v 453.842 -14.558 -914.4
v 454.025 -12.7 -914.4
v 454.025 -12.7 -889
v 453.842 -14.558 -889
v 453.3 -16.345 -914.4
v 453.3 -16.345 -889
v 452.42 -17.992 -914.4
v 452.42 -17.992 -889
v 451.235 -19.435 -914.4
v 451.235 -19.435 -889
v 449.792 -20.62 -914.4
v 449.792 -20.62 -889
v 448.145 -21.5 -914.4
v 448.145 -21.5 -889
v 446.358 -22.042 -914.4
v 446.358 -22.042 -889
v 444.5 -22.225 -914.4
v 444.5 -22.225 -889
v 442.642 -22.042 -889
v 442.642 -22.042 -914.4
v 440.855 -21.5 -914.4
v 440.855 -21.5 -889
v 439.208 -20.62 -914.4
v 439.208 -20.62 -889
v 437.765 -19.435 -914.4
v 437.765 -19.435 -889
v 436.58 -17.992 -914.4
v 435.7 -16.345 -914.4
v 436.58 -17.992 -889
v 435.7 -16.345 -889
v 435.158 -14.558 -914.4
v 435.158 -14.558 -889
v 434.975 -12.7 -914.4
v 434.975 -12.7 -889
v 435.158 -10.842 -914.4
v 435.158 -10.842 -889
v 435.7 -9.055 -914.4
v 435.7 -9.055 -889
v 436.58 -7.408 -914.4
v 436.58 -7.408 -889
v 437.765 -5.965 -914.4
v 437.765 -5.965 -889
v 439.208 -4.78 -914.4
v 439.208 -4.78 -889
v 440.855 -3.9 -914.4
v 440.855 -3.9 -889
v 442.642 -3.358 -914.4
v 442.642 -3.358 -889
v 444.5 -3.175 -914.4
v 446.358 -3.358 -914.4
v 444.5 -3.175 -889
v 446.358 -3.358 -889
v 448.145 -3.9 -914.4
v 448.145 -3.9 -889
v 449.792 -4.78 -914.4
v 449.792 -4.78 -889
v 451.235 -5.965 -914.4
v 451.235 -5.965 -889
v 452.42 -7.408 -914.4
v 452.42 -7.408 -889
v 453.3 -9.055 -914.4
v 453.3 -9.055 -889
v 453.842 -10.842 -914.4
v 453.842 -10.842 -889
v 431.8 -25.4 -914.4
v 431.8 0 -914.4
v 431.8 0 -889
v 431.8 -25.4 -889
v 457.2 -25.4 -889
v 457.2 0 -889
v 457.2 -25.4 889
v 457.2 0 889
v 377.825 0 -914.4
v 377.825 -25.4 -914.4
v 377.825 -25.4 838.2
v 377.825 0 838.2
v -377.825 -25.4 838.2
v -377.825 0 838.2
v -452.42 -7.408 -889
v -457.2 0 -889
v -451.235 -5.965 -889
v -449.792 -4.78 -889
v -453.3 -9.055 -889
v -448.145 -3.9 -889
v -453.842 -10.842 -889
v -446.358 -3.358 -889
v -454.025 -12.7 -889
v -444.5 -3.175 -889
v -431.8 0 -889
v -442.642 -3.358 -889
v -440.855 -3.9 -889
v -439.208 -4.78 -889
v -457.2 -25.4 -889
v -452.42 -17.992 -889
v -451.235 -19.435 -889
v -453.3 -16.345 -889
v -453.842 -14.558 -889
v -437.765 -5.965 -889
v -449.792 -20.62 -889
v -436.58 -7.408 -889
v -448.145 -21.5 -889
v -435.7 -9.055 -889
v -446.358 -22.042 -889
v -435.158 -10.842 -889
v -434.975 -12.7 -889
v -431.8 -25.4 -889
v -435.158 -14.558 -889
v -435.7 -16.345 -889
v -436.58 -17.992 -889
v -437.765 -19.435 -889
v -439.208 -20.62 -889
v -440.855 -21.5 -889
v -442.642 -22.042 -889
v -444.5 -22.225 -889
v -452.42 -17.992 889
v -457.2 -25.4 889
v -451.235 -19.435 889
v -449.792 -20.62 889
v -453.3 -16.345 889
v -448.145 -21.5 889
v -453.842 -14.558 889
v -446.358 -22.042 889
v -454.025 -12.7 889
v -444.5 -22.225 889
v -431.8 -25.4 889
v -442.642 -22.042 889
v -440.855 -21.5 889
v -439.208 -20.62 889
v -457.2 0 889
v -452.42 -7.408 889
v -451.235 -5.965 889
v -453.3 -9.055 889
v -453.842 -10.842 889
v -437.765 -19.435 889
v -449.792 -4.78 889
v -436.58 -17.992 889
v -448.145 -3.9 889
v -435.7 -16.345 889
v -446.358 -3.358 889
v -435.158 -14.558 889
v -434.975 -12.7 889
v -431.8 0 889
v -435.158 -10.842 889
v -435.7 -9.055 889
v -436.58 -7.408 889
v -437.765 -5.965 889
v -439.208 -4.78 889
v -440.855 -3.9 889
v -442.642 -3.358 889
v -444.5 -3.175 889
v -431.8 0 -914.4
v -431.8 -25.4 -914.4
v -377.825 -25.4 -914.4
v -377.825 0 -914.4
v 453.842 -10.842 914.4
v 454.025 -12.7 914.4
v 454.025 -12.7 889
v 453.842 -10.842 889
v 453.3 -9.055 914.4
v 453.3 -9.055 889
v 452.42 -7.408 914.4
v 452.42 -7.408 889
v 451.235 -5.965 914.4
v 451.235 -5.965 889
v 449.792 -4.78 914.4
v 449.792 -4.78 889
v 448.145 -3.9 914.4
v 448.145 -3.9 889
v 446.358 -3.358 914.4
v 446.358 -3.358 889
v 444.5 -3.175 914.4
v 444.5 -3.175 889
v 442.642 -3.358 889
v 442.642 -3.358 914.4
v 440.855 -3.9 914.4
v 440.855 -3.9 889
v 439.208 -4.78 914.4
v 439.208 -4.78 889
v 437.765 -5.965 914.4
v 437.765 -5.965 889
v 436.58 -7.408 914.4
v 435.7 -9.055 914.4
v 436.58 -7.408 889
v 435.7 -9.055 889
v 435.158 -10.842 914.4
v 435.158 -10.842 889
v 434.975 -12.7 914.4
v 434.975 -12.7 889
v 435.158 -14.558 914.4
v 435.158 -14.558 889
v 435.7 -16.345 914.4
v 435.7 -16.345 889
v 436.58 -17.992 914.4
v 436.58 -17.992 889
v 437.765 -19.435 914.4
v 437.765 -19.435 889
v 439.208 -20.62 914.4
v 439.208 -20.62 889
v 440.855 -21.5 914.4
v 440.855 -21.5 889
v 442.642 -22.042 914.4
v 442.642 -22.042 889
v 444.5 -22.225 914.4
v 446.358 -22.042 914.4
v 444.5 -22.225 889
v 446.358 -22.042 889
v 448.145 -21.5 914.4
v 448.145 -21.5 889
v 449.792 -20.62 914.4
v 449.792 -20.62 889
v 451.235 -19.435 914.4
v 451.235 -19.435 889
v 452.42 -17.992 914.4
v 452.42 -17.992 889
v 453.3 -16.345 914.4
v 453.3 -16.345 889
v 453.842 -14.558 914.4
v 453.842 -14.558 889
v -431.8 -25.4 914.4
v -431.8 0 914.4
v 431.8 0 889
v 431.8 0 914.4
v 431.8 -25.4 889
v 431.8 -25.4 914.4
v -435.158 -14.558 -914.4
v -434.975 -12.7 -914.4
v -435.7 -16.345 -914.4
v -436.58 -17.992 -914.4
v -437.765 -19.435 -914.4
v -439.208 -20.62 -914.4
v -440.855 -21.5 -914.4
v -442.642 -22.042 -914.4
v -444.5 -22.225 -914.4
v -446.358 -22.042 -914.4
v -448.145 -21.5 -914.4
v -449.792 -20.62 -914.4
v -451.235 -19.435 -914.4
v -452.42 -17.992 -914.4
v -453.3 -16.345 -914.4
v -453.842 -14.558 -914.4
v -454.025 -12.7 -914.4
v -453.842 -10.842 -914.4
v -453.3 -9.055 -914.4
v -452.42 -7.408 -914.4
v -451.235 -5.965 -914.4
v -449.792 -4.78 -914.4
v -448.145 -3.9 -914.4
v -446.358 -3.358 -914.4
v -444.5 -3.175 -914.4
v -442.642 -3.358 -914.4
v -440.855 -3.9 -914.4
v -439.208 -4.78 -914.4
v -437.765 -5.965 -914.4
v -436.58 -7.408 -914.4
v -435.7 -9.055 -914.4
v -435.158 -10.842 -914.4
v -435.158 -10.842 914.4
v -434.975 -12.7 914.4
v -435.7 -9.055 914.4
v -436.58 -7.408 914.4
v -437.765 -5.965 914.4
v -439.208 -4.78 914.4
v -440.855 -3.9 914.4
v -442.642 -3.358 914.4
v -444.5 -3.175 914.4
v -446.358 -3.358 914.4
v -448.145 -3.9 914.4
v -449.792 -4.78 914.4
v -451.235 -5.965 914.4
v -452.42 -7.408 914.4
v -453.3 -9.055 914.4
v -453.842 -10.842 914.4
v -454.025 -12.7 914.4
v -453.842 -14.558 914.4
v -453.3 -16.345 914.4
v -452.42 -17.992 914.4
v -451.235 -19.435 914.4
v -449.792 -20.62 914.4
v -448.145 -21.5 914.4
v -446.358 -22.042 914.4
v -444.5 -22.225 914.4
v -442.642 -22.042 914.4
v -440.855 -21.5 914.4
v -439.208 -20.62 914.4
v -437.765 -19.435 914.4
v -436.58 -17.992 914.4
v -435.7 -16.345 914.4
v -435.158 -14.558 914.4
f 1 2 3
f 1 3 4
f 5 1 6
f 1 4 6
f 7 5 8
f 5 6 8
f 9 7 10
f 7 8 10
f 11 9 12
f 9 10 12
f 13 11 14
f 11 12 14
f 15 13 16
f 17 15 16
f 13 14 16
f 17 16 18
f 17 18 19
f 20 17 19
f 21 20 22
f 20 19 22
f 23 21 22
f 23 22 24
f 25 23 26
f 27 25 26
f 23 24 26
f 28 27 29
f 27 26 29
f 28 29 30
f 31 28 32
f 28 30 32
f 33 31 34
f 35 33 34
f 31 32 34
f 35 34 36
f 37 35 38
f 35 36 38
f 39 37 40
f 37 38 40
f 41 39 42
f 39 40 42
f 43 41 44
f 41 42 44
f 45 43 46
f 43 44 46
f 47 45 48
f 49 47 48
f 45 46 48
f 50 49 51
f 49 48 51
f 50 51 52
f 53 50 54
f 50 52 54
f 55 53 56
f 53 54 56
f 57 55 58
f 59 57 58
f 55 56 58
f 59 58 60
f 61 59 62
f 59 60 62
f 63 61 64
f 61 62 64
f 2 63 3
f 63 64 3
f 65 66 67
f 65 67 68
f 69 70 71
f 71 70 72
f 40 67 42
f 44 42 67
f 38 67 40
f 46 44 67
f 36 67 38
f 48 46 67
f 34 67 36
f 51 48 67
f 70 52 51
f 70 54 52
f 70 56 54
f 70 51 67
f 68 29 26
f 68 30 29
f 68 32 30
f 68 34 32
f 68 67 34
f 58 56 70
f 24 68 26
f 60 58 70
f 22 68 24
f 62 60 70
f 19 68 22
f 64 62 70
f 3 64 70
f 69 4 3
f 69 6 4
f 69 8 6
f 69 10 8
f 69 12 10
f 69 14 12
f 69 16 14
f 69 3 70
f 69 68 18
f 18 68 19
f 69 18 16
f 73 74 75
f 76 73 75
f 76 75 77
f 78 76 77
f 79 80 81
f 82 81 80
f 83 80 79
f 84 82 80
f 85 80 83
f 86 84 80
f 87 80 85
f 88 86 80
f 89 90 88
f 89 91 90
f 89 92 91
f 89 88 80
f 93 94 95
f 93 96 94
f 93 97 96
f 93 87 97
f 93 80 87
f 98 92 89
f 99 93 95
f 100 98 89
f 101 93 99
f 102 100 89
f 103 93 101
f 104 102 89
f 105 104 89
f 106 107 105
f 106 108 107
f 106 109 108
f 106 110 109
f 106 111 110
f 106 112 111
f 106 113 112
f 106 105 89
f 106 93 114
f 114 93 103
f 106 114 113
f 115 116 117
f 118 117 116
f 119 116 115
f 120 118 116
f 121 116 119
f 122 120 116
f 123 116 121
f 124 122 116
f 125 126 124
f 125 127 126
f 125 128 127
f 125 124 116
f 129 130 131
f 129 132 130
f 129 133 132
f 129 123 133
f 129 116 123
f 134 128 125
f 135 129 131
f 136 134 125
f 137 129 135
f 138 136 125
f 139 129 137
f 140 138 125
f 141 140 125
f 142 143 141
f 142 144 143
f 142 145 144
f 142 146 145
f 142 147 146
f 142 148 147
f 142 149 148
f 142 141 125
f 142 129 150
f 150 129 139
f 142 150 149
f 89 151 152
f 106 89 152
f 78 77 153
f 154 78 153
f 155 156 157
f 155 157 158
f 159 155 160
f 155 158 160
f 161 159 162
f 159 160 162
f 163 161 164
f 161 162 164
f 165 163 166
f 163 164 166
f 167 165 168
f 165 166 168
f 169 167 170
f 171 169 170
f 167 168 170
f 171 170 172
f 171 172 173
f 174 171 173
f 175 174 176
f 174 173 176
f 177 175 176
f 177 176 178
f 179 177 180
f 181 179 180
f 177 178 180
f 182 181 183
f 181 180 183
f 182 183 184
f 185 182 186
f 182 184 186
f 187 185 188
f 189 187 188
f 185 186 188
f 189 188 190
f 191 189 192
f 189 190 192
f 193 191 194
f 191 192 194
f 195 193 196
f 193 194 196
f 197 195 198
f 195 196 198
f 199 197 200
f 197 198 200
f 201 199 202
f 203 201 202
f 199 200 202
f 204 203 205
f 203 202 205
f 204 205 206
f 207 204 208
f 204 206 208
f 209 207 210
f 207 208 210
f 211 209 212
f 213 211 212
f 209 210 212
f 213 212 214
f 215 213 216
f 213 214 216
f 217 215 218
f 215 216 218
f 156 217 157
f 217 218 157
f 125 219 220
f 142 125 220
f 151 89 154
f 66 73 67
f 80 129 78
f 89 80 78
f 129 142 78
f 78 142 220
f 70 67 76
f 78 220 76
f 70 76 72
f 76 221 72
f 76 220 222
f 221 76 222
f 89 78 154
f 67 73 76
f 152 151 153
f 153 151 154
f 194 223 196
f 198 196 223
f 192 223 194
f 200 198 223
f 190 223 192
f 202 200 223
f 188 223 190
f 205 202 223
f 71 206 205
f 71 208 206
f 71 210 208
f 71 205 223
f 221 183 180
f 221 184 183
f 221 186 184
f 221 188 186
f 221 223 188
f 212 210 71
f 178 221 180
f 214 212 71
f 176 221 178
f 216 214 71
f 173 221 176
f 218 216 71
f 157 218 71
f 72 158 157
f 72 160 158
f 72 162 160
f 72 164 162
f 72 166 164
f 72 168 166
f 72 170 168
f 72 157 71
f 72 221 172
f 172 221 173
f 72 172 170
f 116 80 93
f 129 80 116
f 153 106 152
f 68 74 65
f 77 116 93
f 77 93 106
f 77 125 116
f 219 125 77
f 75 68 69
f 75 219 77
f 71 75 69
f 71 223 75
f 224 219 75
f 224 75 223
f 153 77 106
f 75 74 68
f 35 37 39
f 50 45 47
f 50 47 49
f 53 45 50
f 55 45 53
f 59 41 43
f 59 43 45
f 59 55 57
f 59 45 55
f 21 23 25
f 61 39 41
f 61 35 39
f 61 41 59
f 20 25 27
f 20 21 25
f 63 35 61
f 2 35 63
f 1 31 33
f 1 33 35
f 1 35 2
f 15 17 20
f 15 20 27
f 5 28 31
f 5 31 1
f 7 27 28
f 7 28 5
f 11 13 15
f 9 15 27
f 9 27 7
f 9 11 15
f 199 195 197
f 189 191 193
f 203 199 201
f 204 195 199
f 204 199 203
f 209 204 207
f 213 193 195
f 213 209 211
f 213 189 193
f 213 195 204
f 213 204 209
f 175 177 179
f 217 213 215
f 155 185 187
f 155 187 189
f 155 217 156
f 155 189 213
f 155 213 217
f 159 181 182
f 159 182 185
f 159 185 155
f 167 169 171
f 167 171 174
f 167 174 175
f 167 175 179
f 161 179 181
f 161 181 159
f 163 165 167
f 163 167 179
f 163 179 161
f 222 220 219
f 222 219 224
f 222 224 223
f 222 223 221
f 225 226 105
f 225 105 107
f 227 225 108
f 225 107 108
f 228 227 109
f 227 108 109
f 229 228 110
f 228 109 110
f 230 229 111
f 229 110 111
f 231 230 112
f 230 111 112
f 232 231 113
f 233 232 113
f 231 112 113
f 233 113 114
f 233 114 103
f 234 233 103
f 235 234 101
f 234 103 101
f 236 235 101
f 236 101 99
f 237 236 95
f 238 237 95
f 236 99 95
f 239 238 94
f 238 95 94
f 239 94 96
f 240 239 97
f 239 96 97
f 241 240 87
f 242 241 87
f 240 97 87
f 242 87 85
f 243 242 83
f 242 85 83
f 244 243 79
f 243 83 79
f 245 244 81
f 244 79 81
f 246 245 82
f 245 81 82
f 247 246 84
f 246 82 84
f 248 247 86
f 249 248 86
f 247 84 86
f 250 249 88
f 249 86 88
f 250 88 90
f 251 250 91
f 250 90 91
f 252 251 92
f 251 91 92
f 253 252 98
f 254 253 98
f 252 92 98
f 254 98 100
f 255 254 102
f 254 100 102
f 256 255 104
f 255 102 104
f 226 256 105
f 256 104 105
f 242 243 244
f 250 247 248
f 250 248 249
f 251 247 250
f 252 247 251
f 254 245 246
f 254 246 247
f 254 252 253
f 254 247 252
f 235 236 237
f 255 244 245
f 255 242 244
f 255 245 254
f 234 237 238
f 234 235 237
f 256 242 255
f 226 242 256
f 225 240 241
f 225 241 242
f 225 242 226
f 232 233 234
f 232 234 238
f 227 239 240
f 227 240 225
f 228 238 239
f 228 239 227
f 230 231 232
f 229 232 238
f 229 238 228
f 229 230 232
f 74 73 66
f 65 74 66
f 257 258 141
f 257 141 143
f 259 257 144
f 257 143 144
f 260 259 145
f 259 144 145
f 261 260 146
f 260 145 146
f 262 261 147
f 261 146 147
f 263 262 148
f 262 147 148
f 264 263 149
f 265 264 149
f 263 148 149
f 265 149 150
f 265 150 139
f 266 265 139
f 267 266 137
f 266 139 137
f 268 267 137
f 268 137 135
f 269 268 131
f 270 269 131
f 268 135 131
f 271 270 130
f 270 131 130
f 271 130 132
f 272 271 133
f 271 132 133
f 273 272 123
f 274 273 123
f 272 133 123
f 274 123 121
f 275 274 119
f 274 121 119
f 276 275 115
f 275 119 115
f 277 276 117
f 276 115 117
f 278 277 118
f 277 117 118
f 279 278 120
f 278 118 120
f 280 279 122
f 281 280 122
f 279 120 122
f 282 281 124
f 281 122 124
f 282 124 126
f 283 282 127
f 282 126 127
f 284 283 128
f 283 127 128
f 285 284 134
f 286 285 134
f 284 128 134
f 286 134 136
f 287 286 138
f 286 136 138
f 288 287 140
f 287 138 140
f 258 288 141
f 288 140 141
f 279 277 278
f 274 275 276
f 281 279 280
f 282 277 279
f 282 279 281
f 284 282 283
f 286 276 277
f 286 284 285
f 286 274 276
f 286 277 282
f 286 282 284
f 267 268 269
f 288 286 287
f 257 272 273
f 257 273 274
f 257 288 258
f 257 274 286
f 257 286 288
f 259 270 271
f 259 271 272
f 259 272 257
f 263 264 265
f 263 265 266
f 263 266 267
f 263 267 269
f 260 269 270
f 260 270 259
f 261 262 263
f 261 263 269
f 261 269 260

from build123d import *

# Parameters (mm, degrees)
F0_W      = 914.4
F0_H      = 1828.8
F1_DEPTH  = 25.4
F2_W      = 25.4
F2_H      = 25.4
F3_DEPTH  = 25.4
F4_W      = 25.4
F4_H      = 25.4
F5_DEPTH  = 25.4
F6_R      = 9.525
F7_DEPTH  = 25.4
F8_R      = 9.525
F9_DEPTH  = 25.4
F10_R     = 9.525
F11_DEPTH = 25.4
F12_R     = 9.525
F13_DEPTH = 25.4
F15_DEPTH = 25.4


with BuildPart() as f1:
    # F0 (on Front) → F1 (new body)
    with BuildSketch(Plane.XZ):
        Rectangle(F0_W, F0_H)
    extrude(amount=F1_DEPTH)

    # F2 (on face) → F3 (cut)
    with BuildSketch(Plane.XY.offset(914.4)):
        with Locations((-444.5, -12.7)):
            Rectangle(F2_W, F2_H)
        with Locations((444.5, -12.7)):
            Rectangle(F2_W, F2_H)
    extrude(amount=-F3_DEPTH, mode=Mode.SUBTRACT)

    # F4 (on face) → F5 (cut)
    with BuildSketch(Plane(origin=(0, 0, -914.4), x_dir=(1, 0, 0), z_dir=(0, 0, -1))):
        with Locations((-444.5, 12.7)):
            Rectangle(F4_W, F4_H)
        with Locations((444.5, 12.7)):
            Rectangle(F4_W, F4_H)
    extrude(amount=-F5_DEPTH, mode=Mode.SUBTRACT)

    # F6 (on face) → F7 (join)
    with BuildSketch(Plane.XY.offset(889)):
        with Locations((-444.5, -12.7)):
            Circle(F6_R)
    extrude(amount=F7_DEPTH)

    # F8 (on face) → F9 (join)
    with BuildSketch(Plane.XY.offset(889)):
        with Locations((444.5, -12.7)):
            Circle(F8_R)
    extrude(amount=F9_DEPTH)

    # F10 (on face) → F11 (join)
    with BuildSketch(Plane(origin=(0, 0, -889), x_dir=(1, 0, 0), z_dir=(0, 0, -1))):
        with Locations((-444.5, 12.7)):
            Circle(F10_R)
    extrude(amount=F11_DEPTH)

    # F12 (on face) → F13 (join)
    with BuildSketch(Plane(origin=(0, 0, -889), x_dir=(1, 0, 0), z_dir=(0, 0, -1))):
        with Locations((444.5, 12.7)):
            Circle(F12_R)
    extrude(amount=F13_DEPTH)

    # F14 (on face) → F15 (cut)
    with BuildSketch(Plane.XZ.offset(25.4)):
        Polygon((-377.825, 838.2), (-377.825, -914.4), (-323.85, -914.4), (-215.9, -914.4), (0, -914.4), (215.9, -914.4), (323.85, -914.4), (377.825, -914.4), (377.825, 838.2), align=None)
    extrude(amount=-F15_DEPTH, mode=Mode.SUBTRACT)


solid = f1.part
